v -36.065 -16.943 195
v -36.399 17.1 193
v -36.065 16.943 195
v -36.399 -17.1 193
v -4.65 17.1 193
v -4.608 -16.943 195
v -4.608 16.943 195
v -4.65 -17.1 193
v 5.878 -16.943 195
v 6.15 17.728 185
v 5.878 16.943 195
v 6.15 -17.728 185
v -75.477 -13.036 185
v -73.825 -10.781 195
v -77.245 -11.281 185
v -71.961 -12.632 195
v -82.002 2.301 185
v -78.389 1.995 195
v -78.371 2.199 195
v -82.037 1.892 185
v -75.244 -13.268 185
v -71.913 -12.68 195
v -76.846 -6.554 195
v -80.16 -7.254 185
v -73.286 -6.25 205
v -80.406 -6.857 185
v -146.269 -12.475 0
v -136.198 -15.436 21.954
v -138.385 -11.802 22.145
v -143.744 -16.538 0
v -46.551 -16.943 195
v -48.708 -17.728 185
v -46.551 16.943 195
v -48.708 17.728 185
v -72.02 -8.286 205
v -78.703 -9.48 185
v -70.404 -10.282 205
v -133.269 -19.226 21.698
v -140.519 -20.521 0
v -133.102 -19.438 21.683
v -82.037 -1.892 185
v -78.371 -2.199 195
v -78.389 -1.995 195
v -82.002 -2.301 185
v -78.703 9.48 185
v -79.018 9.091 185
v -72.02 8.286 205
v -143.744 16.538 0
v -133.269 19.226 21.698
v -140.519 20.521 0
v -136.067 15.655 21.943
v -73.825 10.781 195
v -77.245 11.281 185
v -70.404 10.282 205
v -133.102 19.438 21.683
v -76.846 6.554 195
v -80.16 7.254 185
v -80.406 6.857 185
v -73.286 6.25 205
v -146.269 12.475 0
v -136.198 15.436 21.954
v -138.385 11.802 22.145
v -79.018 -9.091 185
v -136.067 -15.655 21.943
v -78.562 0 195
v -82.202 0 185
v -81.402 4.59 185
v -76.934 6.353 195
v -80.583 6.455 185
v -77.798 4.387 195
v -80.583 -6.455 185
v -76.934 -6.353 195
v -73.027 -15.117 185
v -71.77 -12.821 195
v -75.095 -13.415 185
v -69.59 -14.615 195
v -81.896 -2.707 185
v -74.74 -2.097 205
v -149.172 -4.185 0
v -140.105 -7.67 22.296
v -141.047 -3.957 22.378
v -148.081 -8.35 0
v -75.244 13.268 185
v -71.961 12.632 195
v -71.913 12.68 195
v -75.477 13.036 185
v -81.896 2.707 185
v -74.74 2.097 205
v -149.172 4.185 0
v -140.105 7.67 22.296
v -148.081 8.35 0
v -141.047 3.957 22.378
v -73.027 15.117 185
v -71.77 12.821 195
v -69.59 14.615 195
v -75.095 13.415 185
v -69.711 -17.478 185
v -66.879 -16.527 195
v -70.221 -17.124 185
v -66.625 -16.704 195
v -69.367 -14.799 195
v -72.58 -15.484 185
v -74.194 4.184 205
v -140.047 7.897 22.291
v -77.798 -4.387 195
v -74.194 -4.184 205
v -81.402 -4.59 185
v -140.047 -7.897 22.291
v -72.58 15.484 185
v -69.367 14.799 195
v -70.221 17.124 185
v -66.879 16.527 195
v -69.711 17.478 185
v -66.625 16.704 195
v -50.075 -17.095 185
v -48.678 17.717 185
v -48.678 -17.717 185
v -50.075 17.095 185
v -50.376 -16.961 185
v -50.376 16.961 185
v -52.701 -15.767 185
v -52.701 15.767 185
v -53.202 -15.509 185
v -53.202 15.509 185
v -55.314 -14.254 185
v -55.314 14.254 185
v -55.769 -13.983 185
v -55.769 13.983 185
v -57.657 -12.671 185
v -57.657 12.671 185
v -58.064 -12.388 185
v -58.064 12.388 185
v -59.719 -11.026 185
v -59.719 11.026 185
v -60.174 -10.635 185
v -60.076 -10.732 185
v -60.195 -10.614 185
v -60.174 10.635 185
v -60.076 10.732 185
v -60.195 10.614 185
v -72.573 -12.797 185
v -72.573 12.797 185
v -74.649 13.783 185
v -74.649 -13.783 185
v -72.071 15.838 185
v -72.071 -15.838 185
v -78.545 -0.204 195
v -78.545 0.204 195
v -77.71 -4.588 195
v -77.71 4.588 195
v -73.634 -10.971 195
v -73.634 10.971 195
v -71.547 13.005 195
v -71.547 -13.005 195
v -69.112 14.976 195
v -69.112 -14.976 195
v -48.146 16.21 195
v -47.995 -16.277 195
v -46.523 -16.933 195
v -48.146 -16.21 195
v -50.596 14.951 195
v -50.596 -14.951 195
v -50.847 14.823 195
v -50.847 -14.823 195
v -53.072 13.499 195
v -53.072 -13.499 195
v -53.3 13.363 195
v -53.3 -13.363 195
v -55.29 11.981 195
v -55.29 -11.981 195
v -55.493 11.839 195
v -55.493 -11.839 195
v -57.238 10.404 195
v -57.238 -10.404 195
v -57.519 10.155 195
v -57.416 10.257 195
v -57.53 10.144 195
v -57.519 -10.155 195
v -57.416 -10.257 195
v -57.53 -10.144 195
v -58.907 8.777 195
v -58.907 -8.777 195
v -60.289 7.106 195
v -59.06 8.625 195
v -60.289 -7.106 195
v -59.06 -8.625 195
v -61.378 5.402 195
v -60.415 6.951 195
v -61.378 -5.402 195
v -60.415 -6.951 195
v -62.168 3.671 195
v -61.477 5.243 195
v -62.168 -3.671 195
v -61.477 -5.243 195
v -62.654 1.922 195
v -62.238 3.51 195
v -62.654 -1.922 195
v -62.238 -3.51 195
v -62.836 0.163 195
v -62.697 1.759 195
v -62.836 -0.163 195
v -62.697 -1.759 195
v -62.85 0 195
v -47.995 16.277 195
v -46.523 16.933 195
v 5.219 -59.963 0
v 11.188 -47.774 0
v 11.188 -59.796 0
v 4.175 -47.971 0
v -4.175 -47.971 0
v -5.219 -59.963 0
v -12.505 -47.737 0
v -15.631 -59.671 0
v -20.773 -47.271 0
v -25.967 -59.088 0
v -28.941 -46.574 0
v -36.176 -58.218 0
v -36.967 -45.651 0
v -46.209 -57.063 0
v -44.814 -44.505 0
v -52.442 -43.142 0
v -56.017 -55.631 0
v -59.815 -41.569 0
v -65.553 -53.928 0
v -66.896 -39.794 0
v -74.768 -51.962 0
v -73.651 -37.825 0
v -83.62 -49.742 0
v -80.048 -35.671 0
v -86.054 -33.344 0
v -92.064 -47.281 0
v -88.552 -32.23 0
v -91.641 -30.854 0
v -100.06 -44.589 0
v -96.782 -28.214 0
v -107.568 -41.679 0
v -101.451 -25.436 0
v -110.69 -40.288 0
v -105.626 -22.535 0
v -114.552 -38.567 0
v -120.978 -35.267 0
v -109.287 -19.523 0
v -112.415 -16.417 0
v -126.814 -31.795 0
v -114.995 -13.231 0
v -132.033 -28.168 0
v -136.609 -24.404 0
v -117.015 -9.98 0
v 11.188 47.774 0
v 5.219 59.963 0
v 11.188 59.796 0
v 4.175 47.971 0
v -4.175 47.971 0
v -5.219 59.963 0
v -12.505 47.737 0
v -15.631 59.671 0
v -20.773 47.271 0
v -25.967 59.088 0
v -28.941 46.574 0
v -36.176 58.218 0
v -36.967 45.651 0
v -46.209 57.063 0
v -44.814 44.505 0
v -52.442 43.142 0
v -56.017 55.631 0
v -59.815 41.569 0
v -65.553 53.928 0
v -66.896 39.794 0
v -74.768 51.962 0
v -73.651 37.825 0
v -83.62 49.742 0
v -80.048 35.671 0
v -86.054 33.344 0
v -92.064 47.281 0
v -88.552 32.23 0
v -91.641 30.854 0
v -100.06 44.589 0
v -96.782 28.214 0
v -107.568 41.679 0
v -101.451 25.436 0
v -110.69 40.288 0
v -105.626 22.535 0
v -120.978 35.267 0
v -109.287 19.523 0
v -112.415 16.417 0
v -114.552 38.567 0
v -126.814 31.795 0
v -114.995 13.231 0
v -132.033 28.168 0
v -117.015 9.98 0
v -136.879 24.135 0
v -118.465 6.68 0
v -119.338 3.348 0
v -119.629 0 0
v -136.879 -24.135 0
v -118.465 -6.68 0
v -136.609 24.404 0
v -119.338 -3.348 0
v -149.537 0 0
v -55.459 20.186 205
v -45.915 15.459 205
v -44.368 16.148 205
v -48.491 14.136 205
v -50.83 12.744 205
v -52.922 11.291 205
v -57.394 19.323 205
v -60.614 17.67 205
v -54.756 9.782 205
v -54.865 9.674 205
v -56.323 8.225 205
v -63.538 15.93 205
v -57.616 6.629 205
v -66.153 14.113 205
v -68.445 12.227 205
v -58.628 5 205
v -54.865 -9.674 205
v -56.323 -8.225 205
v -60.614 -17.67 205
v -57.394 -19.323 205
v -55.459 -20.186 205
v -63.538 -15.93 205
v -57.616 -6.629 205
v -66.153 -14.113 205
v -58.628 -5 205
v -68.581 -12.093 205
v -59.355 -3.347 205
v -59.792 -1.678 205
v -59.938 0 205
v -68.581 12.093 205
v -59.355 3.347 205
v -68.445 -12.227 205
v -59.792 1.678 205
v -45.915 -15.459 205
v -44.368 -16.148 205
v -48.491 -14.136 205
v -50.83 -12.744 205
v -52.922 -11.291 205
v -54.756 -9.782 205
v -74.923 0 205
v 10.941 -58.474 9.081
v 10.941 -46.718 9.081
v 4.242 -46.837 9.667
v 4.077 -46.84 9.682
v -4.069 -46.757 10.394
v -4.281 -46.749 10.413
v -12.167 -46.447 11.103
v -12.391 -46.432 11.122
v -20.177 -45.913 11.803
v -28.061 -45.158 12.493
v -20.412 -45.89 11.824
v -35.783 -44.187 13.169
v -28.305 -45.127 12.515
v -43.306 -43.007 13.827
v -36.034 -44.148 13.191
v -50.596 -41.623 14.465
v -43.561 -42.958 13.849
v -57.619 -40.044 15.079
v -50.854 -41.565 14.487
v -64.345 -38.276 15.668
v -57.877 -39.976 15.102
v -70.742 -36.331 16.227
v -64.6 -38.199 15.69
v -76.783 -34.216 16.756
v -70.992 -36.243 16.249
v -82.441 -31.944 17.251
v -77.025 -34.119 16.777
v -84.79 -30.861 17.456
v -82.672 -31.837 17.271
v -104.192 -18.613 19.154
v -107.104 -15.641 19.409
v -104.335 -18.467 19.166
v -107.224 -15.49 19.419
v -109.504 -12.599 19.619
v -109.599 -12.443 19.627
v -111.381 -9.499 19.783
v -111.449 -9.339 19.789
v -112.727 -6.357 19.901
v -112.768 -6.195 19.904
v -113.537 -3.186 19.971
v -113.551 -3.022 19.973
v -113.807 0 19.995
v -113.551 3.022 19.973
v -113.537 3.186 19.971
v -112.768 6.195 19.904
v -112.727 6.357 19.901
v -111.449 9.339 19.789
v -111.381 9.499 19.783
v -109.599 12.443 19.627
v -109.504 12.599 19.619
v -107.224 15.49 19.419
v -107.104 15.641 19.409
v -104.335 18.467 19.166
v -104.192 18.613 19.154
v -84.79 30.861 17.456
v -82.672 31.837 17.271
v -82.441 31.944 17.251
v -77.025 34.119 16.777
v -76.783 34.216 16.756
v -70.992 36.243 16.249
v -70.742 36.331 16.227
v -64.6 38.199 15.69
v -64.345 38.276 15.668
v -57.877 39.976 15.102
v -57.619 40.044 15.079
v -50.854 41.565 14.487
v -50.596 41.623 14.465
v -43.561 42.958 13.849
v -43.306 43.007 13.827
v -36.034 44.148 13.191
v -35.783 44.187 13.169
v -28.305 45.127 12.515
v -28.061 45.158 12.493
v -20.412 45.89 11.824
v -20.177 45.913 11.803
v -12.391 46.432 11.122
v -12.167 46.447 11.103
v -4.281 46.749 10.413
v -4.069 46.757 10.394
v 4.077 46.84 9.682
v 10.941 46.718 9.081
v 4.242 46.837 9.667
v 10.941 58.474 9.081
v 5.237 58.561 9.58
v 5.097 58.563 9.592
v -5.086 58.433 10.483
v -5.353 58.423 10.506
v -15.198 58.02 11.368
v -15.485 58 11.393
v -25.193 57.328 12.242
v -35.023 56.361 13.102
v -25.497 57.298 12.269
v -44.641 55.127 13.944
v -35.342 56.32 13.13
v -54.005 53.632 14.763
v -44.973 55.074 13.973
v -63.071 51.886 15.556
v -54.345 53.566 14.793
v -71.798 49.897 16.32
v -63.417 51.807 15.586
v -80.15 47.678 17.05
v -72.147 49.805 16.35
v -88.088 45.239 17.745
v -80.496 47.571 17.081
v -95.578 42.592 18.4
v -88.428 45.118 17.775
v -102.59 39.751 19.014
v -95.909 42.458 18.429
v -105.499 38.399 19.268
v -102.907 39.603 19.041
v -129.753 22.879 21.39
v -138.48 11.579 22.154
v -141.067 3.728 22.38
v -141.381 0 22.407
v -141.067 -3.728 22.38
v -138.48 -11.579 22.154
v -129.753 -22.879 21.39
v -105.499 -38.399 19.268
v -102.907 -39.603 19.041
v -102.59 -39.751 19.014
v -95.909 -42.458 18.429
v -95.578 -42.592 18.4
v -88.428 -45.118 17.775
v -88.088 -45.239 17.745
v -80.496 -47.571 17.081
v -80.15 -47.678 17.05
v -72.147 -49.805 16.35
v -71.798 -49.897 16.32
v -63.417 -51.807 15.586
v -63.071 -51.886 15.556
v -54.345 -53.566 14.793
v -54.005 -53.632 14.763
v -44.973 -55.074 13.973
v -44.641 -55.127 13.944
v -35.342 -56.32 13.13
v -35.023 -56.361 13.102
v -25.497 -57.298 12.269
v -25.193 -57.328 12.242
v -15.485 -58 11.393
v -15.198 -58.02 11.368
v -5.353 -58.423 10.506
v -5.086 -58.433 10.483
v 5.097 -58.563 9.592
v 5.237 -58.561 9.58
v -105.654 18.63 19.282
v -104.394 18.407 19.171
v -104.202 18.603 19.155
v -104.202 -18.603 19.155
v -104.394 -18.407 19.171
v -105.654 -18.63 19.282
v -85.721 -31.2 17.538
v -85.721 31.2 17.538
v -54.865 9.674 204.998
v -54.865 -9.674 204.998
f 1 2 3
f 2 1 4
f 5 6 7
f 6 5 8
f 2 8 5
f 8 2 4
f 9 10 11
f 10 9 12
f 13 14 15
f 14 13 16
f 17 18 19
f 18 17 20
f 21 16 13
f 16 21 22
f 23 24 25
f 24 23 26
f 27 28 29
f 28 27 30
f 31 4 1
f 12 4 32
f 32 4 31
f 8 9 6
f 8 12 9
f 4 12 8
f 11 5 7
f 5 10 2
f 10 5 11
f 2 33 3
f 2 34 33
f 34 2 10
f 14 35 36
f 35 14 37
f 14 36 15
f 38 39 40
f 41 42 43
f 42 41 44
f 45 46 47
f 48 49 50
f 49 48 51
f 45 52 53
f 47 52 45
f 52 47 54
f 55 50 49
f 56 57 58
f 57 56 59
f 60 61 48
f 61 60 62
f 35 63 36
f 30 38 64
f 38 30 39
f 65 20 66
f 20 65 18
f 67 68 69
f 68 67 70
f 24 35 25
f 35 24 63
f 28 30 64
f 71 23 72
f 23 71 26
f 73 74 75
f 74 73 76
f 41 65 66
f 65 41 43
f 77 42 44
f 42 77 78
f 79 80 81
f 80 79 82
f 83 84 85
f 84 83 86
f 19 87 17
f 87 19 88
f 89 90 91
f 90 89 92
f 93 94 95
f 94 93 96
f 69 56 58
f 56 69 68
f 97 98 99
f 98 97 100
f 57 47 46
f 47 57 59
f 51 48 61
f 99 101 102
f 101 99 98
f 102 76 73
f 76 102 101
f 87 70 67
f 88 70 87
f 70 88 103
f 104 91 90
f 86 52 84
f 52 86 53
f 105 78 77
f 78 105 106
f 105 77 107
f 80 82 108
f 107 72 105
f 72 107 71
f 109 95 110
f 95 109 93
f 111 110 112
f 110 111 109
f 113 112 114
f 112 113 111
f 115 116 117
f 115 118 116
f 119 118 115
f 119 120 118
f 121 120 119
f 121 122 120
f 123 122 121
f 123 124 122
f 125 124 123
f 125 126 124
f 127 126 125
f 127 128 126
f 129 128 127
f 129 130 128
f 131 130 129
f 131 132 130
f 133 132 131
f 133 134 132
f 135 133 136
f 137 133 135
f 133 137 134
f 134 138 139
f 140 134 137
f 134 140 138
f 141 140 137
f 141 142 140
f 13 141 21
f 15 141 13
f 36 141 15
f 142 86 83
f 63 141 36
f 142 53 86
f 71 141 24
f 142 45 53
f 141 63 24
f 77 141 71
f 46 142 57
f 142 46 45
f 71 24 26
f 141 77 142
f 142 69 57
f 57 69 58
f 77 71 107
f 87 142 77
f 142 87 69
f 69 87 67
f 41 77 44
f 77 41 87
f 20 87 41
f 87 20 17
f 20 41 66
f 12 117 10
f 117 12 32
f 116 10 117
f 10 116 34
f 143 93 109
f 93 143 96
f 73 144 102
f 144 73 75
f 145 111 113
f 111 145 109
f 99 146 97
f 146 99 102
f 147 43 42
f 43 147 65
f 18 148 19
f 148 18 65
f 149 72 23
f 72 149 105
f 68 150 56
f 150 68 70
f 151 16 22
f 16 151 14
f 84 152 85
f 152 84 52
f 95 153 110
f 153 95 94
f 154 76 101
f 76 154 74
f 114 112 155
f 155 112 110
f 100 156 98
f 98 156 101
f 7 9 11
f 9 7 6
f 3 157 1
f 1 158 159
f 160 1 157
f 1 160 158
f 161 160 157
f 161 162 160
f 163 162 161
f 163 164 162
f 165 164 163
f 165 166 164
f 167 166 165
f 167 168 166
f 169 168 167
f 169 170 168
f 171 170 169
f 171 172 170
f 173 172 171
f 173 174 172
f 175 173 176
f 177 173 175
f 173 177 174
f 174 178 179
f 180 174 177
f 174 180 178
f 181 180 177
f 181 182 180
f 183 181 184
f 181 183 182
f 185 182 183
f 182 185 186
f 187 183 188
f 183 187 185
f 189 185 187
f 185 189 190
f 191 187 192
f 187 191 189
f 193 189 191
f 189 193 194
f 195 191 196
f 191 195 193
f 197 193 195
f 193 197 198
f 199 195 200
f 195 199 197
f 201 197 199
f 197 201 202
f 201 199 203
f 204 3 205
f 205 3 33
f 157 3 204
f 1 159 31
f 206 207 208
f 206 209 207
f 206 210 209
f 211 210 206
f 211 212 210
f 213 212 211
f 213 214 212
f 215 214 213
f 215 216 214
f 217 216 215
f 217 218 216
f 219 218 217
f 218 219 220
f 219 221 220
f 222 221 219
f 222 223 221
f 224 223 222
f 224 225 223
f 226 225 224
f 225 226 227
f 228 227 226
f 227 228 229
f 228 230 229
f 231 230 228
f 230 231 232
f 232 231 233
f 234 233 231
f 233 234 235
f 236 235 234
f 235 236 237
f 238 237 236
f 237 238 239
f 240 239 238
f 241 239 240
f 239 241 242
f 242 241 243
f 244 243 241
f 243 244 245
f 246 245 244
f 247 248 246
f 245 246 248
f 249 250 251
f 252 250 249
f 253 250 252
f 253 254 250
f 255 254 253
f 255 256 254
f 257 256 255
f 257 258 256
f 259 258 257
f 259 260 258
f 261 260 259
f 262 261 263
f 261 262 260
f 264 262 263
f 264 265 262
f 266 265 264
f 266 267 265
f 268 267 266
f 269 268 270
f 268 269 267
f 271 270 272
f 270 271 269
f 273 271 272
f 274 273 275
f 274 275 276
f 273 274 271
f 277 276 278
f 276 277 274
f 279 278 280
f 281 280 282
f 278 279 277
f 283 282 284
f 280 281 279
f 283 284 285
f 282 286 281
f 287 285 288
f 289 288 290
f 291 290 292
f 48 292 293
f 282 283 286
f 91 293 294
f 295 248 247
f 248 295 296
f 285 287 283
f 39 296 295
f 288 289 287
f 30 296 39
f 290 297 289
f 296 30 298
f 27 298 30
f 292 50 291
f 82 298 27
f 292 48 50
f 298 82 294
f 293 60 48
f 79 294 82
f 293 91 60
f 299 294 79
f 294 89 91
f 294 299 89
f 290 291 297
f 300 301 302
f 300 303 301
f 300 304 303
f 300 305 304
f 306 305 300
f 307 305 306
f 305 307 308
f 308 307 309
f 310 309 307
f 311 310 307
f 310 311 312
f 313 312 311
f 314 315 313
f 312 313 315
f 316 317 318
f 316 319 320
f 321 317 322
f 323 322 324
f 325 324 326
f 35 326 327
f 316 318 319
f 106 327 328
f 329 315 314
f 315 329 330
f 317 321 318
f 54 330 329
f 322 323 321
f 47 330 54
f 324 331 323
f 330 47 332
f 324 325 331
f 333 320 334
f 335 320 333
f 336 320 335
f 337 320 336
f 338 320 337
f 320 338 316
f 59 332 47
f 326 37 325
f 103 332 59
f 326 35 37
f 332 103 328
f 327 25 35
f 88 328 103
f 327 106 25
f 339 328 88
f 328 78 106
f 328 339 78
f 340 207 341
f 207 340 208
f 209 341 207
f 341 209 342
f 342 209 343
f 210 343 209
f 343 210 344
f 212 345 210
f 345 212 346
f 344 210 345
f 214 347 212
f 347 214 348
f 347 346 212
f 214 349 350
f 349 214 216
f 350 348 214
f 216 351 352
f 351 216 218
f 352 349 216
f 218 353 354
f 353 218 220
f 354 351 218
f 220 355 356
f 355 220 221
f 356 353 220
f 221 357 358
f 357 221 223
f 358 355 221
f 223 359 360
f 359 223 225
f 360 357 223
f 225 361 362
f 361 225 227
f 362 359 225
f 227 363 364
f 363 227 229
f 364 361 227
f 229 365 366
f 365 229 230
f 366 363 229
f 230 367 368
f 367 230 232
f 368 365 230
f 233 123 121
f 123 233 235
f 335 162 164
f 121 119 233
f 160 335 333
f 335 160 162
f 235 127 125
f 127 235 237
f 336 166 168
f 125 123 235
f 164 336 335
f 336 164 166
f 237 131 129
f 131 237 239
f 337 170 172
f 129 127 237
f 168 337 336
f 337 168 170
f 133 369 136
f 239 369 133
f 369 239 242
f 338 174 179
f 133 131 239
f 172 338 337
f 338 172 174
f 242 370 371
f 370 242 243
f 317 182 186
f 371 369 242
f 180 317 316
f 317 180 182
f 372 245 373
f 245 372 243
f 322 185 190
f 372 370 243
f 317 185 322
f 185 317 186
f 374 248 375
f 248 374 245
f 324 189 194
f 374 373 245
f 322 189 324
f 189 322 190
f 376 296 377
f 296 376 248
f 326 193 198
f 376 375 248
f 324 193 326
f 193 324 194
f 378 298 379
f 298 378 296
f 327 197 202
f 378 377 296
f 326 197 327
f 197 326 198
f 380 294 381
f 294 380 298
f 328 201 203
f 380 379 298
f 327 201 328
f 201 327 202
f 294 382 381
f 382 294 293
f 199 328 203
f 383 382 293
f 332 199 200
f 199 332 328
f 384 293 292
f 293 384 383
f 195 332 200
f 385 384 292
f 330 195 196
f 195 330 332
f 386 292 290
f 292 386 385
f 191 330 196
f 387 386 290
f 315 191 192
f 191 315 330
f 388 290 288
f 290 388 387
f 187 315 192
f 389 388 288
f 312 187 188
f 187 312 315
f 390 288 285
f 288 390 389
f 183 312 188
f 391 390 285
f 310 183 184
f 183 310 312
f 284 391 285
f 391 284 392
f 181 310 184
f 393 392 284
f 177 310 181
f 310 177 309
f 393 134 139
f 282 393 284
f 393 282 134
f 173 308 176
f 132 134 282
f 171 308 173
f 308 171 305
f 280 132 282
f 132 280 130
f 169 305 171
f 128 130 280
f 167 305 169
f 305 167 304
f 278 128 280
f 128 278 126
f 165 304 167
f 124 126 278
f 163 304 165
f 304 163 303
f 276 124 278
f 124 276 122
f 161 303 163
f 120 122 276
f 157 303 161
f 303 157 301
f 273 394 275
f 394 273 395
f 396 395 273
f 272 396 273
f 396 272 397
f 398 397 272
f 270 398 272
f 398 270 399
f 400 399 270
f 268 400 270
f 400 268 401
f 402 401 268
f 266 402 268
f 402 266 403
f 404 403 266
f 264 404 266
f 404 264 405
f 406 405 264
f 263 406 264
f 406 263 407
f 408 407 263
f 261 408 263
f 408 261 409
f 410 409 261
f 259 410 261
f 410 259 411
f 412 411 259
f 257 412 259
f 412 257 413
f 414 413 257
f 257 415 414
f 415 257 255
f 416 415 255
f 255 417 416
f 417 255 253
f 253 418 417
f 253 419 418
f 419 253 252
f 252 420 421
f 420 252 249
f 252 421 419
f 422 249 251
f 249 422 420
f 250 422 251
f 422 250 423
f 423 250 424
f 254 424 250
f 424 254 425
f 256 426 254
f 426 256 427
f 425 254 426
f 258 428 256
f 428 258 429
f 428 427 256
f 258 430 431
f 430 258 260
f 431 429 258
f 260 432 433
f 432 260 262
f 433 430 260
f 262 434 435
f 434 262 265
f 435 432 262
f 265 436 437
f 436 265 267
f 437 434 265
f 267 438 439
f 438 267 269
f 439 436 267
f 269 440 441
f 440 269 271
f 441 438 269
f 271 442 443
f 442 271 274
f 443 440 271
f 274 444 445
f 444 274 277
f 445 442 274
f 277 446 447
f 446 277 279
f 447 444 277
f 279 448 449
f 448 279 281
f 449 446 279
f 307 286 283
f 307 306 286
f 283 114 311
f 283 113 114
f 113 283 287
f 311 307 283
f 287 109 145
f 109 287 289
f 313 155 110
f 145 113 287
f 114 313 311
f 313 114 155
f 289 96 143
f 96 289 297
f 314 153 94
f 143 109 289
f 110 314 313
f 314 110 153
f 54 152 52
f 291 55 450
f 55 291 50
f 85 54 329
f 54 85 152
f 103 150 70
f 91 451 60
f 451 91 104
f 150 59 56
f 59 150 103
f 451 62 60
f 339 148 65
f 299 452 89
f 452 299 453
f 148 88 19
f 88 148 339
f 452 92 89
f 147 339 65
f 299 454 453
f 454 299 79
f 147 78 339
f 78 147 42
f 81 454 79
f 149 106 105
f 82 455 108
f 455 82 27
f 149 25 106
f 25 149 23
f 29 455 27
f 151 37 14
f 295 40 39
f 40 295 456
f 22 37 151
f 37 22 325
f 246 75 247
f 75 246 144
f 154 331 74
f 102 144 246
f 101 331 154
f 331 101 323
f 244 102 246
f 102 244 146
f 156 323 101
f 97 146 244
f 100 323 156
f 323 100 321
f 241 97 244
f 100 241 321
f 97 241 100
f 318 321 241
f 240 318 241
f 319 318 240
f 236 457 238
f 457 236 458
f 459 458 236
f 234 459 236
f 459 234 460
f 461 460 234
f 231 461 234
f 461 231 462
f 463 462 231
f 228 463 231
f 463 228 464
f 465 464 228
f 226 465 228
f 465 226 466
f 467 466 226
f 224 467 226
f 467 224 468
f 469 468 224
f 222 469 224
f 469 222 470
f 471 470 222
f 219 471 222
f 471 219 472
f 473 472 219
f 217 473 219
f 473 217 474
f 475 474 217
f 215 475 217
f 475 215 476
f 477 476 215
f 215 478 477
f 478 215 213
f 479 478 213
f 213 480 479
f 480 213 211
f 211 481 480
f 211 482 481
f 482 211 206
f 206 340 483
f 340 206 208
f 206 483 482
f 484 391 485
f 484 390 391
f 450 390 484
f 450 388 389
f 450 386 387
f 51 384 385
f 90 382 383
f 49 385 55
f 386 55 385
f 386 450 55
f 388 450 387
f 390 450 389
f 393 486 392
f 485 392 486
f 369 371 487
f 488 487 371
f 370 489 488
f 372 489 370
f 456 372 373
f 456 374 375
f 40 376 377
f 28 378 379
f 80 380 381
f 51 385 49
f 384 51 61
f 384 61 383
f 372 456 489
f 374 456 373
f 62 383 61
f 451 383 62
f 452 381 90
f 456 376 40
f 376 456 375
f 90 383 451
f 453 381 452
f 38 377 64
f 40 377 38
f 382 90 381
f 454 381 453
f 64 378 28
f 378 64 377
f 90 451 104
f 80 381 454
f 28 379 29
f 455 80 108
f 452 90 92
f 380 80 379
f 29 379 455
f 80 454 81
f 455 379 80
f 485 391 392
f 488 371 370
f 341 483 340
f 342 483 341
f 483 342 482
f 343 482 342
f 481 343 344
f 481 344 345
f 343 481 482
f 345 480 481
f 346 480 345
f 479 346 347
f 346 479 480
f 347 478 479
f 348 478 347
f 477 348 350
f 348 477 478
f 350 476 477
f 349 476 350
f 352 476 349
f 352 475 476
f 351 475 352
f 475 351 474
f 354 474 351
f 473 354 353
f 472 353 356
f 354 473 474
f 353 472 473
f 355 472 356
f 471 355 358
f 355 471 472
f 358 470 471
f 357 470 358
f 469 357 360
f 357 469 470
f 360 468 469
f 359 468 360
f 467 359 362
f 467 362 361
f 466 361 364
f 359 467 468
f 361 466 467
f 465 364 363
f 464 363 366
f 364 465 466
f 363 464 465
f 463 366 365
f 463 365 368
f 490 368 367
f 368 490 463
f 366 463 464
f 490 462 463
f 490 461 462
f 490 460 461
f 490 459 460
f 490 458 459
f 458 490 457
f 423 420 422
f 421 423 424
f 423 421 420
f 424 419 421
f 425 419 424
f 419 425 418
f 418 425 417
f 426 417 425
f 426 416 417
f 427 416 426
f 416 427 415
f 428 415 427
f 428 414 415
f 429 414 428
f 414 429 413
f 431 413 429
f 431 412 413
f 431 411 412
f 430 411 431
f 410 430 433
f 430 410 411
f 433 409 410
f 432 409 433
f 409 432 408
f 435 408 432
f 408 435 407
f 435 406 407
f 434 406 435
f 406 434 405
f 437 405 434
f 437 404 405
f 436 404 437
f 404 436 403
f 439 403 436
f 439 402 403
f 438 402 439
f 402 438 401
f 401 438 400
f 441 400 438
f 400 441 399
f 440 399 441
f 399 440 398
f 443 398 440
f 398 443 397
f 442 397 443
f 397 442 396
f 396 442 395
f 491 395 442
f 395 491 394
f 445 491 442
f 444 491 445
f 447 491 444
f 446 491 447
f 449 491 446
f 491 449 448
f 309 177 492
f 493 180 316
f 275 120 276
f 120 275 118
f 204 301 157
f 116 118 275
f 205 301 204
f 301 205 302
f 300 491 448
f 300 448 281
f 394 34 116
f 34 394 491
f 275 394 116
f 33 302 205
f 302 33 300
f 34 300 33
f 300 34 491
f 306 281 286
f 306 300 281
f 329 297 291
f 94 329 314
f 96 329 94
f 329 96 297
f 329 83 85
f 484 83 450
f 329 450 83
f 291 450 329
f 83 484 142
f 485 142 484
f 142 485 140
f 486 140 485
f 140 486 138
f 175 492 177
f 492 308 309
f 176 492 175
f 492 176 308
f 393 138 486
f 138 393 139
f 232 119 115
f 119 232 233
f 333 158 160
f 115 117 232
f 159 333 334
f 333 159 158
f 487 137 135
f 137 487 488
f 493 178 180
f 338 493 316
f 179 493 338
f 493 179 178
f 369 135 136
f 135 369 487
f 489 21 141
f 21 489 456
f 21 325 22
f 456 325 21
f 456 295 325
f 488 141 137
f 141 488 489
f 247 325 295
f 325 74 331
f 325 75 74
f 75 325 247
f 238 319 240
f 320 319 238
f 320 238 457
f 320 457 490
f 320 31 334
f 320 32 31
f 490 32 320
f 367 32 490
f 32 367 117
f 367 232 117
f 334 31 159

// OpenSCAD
////////////////////////////////////////////////////////////////////////////////
// Head Phone Stand
////////////////////////////////////////////////////////////////////////////////
//
// (c) Andreas Mueller
// License: Creative Commans - Attribution
// http://creativecommons.org/licenses/by/4.0/
//
////////////////////////////////////////////////////////////////////////////////

// Height (mm)
height = 205 ; // [150:250]
// Length (mm)
length =  50 ; // [ 40: 80]
// Angle (°)
angle  =  70 ; // [ 60: 90]
// Print in two parts
split = 0 ;    // [0:all, 1:split]

// calculating round edges takes very long time
roundEdge = 0+0 ; // [0:no, 1:yes]

/* [Hidden] */

////////////////////////////////////////////////////////////////////////////////

module headPhoneStand(height=185, lengthTop=50, angle=70, split=0, roundEdge=0)
{
  $fn = 90 ;
  length0 = height / tan(angle) ;
  lengthBottom = (lengthTop+length0) * 1.2 ;

  extrudeScale = (lengthBottom-length0) / lengthBottom ;
  widthBottom = 120 ;

  a = lengthBottom * 0.8 ;
  b = widthBottom / 2 * 0.8 ;
  t = tan(20) ;
  x = (a*b) / sqrt(b*b + a*a * t*t) ;
  y = (b/a) * sqrt(a*a - x*x) ;

  l = x - lengthTop/extrudeScale ;

  ////////////////////////////////////////
  
  module platform()
  {
    difference()
    {
      linear_extrude(height=height, scale=extrudeScale)
        difference()
      {
        scale([2*lengthBottom, widthBottom]) circle(d=1, $fa=12, $fs=2) ;
      
        translate([0,  widthBottom+y]) square([lengthBottom*2, widthBottom*2], center=true) ;
        translate([0, -widthBottom-y]) square([lengthBottom*2, widthBottom*2], center=true) ;
        translate([ lengthBottom-l,0]) square([lengthBottom*2, widthBottom*2], center=true) ;
      }

      translate ([0, 0, height/2 - 20]) cube([4*lengthBottom, 4*widthBottom, height], center=true) ;
      translate ([0, 0, 1.5*height   - 10]) cube([4*lengthBottom, 4*widthBottom, height], center=true) ;

      difference()
      {
        lx = (lengthTop-20)/extrudeScale ;
        linear_extrude(height=height, scale=extrudeScale)
        translate([-x+lx/2+10/extrudeScale,0])
        square([lx, widthBottom], center=true) ;

        translate([0,0,height/2-12])
        cube([4*lengthBottom, 4*widthBottom, height], center=true) ;
      }
    }
  }

  ////////////////////////////////////////
  
  module base()
  {
    module baseShape(length, width)
    {
      difference()
      {
        scale([2*length, width]) circle(d=1, $fa=12, $fs=2) ;
        scale([2*length*0.8, width*0.8]) circle(d=1, $fa=12, $fs=2) ;
        translate([length-l,0]) square([length*2, width*2], center=true) ;
      }
    }

    difference()
    {
      linear_extrude(height=height, scale=extrudeScale)
        baseShape(lengthBottom, widthBottom) ;

      translate([0,0,height*0.75-20])
        cube([5*lengthBottom, 5*lengthBottom, height/2], center=true) ;
      rotate([0,5,0])
        translate([0,0,height*0.25+10])
        cube([5*lengthBottom, 5*lengthBottom, height/2], center=true) ;
    
      rotate([0,0,80])
        translate([0,-lengthBottom,20])
        cube([5*lengthBottom, 5*lengthBottom,height]) ;
      rotate([0,0,190])
        translate([-lengthBottom,0,20])
        cube([5*lengthBottom, 5*lengthBottom,height]) ;
    }

    linear_extrude(height=height, scale=extrudeScale)
      difference()
    {
      baseShape(lengthBottom, widthBottom) ;
      rotate(  70) translate([0,-2.5*lengthBottom]) square(5*lengthBottom) ;
      rotate(-100) translate([0,-2.5*lengthBottom]) square(5*lengthBottom) ;
    }

    linear_extrude(height=height, scale=extrudeScale)
      difference()
    {
      baseShape(lengthBottom, widthBottom) ;
      rotate(-70) translate([0,-2.5*lengthBottom]) square(5*lengthBottom) ;
      rotate(100) translate([0,-2.5*lengthBottom]) square(5*lengthBottom) ;
    }
  }

  ////////////////////////////////////////
  
  module roundEdge()
  {
    if (roundEdge > 0)
    {
      difference()
      {
        minkowski()
        {
          sphere(d=4, $fn = 20) ;
          union()
          {
            children() ;
          }
        }

        translate([0,0,-500]) cube([1000,1000,1000], center=true) ;
      }
    }
    else
    {
      children() ;      
    }
  }

  ////////////////////////////////////////
  
  module split()
  {
    splitHeight = (roundEdge>0) ? height - 22 : height - 20 ;
    echo(splitHeight=splitHeight) ;

    if (split > 0)
    {
      difference()
      {
        union() children() ;
        translate([0, 0, 1.5*splitHeight]) cube([4*lengthBottom, 4*widthBottom, splitHeight], center=true) ;
      }

      translate([length/2, 0, -splitHeight])
      difference()
      {
        union() children() ;
        translate([0, 0, 0.5*splitHeight]) cube([4*lengthBottom, 4*widthBottom, splitHeight], center=true) ;
      }

    }
    else
    {
      children() ;
    }
  }

  ////////////////////////////////////////
  
  split()
  {
    roundEdge()
    {
      platform() ;
      base() ;
    }
  }
}

////////////////////////////////////////////////////////////////////////////////

headPhoneStand(height, length, angle, split, roundEdge) ;

////////////////////////////////////////////////////////////////////////////////
// EOF
////////////////////////////////////////////////////////////////////////////////
